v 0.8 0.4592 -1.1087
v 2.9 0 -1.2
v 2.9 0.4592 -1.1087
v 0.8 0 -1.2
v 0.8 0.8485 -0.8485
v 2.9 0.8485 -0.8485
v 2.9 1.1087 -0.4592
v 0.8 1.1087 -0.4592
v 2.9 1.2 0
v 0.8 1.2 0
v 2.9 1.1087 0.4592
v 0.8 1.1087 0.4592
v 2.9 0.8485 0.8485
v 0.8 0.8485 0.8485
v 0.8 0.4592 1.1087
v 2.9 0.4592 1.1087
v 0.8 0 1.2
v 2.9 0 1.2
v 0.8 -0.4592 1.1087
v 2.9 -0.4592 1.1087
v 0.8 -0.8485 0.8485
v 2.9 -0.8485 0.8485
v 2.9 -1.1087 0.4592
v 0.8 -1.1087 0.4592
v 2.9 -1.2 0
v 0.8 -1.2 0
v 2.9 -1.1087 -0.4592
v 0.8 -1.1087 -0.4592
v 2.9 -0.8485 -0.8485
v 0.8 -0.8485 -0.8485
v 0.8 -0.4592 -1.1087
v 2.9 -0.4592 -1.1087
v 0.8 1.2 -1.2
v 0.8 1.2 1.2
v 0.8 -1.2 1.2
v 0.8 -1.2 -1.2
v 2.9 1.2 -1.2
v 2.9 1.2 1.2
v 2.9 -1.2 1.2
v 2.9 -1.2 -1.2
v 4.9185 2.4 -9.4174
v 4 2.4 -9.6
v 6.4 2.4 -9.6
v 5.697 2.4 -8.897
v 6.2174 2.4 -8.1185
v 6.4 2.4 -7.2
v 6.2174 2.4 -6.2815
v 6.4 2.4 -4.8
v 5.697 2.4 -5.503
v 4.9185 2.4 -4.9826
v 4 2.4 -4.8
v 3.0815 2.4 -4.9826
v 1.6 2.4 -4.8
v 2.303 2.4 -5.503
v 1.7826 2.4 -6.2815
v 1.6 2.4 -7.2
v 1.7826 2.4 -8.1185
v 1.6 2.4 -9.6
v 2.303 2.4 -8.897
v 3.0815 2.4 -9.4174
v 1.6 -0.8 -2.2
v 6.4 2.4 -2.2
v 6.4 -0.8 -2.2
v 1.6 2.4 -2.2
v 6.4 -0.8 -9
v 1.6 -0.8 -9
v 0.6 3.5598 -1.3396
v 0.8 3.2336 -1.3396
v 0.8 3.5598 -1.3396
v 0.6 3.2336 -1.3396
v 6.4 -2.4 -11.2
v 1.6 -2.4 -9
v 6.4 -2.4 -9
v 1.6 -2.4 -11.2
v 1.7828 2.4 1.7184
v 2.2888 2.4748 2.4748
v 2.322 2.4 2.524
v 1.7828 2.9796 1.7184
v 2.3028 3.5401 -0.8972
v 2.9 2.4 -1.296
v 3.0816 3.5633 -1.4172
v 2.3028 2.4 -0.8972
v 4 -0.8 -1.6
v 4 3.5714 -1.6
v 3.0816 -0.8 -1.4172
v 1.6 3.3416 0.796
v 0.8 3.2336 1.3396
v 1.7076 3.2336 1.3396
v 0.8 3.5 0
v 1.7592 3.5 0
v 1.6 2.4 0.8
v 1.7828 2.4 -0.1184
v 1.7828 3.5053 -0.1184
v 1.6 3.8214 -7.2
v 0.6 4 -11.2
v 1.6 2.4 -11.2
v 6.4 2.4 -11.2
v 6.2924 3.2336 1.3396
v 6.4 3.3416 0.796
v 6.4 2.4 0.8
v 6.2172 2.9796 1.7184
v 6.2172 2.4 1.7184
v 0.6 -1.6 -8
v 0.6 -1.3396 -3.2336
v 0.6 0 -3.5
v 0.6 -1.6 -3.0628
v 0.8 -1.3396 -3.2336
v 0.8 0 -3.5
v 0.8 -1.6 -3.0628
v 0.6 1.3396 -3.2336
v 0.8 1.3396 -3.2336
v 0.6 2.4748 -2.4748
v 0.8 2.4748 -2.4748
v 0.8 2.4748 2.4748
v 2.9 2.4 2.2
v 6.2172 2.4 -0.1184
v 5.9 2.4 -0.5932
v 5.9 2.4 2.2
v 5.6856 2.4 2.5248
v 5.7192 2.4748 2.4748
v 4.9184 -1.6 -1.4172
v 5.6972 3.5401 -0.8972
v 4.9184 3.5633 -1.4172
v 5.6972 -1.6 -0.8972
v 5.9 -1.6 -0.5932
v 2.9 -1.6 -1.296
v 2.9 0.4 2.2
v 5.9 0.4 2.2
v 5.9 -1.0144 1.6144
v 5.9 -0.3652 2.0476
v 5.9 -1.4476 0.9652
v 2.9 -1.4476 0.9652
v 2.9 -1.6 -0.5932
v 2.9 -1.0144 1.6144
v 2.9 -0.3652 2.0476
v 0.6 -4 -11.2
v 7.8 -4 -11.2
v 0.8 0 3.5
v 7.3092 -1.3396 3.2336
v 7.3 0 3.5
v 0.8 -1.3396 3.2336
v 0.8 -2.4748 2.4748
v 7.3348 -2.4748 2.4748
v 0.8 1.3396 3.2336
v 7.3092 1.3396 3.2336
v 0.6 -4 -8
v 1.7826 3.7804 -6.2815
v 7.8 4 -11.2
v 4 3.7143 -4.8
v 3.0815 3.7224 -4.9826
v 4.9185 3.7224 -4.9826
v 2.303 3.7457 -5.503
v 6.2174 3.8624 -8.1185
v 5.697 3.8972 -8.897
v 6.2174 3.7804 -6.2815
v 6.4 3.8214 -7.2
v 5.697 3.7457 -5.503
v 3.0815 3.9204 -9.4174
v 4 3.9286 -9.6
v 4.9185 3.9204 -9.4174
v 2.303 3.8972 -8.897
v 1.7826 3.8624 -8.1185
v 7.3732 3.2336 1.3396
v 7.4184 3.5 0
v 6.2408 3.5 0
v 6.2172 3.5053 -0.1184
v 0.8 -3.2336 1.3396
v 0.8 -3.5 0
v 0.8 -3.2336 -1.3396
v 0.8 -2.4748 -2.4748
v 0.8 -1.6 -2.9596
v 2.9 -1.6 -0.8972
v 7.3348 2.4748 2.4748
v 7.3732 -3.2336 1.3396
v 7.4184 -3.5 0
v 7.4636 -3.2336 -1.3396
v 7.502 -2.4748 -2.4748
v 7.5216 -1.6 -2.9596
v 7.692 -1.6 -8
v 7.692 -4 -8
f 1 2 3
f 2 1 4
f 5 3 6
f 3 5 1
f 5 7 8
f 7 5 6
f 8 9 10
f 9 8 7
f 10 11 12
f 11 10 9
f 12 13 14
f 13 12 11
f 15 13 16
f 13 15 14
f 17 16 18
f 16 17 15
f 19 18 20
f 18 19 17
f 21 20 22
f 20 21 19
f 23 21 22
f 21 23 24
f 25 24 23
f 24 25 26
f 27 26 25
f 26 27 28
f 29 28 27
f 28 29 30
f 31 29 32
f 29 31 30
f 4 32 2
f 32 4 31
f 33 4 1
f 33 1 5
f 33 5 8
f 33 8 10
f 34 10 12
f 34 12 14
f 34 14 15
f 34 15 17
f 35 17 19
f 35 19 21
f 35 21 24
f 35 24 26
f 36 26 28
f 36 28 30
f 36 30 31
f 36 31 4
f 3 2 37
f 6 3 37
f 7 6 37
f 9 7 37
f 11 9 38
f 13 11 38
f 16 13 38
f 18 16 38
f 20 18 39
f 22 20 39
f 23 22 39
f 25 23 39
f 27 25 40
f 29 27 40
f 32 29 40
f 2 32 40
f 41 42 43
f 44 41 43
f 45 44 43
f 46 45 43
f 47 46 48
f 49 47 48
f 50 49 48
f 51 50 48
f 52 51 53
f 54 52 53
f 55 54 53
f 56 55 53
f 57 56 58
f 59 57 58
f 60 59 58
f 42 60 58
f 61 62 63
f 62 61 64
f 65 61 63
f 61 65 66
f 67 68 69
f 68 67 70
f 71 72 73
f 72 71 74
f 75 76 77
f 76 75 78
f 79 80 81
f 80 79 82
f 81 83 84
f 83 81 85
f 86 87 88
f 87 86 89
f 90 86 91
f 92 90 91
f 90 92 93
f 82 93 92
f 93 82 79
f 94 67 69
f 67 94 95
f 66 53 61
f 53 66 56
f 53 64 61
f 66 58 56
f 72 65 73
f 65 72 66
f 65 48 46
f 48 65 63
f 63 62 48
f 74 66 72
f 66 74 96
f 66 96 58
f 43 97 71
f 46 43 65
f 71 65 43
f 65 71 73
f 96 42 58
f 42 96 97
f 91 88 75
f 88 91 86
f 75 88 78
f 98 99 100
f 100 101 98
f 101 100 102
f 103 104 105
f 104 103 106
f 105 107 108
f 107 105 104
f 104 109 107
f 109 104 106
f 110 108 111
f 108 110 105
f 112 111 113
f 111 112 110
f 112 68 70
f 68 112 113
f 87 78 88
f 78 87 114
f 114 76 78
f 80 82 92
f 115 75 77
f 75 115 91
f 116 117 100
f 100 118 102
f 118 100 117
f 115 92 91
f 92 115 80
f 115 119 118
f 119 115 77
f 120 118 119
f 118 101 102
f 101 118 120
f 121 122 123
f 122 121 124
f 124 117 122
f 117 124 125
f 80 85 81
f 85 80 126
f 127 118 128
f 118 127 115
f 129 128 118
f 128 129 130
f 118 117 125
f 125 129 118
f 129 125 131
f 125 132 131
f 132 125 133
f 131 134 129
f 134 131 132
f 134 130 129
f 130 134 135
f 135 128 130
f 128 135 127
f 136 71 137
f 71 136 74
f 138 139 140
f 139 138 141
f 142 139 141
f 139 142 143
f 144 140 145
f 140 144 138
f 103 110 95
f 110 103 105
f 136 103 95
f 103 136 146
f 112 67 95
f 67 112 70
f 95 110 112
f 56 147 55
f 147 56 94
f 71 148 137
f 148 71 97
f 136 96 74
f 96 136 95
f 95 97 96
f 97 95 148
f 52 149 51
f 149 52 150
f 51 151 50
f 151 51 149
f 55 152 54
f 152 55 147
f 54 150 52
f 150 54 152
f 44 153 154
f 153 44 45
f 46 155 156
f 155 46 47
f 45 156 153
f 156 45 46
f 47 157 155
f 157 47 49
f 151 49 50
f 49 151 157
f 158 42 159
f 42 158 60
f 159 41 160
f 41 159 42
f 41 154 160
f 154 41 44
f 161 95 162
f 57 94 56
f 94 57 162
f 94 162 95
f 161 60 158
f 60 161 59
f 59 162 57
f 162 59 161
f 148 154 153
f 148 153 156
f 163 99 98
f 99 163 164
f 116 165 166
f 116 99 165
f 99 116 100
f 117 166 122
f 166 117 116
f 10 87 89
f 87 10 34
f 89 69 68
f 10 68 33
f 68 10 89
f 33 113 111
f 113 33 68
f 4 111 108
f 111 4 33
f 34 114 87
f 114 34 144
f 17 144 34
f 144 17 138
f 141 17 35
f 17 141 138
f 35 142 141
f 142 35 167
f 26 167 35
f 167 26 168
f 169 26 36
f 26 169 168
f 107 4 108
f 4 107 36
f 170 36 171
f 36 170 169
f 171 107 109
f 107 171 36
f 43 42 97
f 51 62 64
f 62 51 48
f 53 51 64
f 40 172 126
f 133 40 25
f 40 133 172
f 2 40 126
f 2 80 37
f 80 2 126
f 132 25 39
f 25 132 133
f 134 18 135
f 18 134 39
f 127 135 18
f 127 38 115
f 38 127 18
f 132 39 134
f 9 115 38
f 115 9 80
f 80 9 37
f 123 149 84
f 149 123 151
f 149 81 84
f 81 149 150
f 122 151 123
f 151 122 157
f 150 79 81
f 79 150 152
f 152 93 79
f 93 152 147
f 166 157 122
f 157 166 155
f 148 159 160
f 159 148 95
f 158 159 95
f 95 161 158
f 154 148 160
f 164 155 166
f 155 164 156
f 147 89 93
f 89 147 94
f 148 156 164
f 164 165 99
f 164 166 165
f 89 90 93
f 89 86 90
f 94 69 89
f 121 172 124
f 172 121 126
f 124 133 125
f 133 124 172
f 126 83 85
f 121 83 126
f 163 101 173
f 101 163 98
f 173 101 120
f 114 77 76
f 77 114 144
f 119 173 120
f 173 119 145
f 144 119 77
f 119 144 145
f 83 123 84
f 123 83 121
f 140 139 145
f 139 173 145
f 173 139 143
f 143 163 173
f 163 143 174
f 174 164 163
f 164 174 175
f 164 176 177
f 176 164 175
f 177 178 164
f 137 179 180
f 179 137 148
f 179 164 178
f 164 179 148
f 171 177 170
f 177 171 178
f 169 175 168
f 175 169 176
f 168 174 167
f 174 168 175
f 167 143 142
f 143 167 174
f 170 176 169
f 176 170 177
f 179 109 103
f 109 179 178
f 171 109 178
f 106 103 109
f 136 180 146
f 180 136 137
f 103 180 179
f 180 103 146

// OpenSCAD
use <../lib.scad>
use <s/3817bs01.scad>
use <s/3817bs03.scad>
$fa=1; $fs=0.2;
function ldraw_lib__3817b(realsolid=false) = [
// 0 Minifig Leg Left
// 0 Name: 3817b.dat
// 0 Author: Nils Schmidt [BlackBrick89]
// 0 !LDRAW_ORG Part UPDATE 2019-01
// 0 !LICENSE Licensed under CC BY 2.0 and CC BY 4.0 : see CAreadme.txt
// 
// 0 !HELP Move down 12 units to align with hips
// 
// 0 BFC CERTIFY CCW
  [0,"BFC","CERTIFY"],
  [0,"BFC","CCW"],
// 
// 0 !HISTORY 2019-06-28 [PTadmin] Official Update 2019-01
// 
// 
// 1 16 0 0 0 1 0 0 0 1 0 0 0 1 s\3817bs01.dat
  [1,16,0,0,0,1,0,0,0,1,0,0,0,1, ldraw_lib__s__3817bs01(realsolid)],
// 0 // Rounded Front
// 1 16 0 0 0 1 0 0 0 1 0 0 0 1 s\3817bs03.dat
  [1,16,0,0,0,1,0,0,0,1,0,0,0,1, ldraw_lib__s__3817bs03(realsolid)],
// 0 // Flat Front
// 4 16 2 7.657 -4 1.5 20 -4 19.23 20 -4 18.804 7.399 -4
  [4,16,2,7.657,-4,1.5,20,-4,19.23,20,-4,18.804,7.399,-4],
// 3 16 2 7.399 -4 2 7.657 -4 18.804 7.399 -4
  [3,16,2,7.399,-4,2,7.657,-4,18.804,7.399,-4],
// 3 16 1.5 7.657 -4 1.5 20 -4 2 7.657 -4
  [3,16,1.5,7.657,-4,1.5,20,-4,2,7.657,-4],
// 0 // Foot Front
// 4 16 19.5 28 -10 19.23 20 -10 1.5 20 -10 1.5 28 -10
  [4,16,19.5,28,-10,19.23,20,-10,1.5,20,-10,1.5,28,-10],
// 0 // Foot Top
// 4 16 1.5 20 -4 1.5 20 -10 19.23 20 -10 19.23 20 -4
  [4,16,1.5,20,-4,1.5,20,-10,19.23,20,-10,19.23,20,-4],
];
module ldraw_lib__3817b(step=0, col=false, unit=2/5, alt=false, line=0.2, solid=!$preview)
    makepoly(ldraw_lib__3817b(solid), step=step, col=col, unit=unit, alt=alt, line=line, solid=solid);
ldraw_lib__3817b(line=0.2);
